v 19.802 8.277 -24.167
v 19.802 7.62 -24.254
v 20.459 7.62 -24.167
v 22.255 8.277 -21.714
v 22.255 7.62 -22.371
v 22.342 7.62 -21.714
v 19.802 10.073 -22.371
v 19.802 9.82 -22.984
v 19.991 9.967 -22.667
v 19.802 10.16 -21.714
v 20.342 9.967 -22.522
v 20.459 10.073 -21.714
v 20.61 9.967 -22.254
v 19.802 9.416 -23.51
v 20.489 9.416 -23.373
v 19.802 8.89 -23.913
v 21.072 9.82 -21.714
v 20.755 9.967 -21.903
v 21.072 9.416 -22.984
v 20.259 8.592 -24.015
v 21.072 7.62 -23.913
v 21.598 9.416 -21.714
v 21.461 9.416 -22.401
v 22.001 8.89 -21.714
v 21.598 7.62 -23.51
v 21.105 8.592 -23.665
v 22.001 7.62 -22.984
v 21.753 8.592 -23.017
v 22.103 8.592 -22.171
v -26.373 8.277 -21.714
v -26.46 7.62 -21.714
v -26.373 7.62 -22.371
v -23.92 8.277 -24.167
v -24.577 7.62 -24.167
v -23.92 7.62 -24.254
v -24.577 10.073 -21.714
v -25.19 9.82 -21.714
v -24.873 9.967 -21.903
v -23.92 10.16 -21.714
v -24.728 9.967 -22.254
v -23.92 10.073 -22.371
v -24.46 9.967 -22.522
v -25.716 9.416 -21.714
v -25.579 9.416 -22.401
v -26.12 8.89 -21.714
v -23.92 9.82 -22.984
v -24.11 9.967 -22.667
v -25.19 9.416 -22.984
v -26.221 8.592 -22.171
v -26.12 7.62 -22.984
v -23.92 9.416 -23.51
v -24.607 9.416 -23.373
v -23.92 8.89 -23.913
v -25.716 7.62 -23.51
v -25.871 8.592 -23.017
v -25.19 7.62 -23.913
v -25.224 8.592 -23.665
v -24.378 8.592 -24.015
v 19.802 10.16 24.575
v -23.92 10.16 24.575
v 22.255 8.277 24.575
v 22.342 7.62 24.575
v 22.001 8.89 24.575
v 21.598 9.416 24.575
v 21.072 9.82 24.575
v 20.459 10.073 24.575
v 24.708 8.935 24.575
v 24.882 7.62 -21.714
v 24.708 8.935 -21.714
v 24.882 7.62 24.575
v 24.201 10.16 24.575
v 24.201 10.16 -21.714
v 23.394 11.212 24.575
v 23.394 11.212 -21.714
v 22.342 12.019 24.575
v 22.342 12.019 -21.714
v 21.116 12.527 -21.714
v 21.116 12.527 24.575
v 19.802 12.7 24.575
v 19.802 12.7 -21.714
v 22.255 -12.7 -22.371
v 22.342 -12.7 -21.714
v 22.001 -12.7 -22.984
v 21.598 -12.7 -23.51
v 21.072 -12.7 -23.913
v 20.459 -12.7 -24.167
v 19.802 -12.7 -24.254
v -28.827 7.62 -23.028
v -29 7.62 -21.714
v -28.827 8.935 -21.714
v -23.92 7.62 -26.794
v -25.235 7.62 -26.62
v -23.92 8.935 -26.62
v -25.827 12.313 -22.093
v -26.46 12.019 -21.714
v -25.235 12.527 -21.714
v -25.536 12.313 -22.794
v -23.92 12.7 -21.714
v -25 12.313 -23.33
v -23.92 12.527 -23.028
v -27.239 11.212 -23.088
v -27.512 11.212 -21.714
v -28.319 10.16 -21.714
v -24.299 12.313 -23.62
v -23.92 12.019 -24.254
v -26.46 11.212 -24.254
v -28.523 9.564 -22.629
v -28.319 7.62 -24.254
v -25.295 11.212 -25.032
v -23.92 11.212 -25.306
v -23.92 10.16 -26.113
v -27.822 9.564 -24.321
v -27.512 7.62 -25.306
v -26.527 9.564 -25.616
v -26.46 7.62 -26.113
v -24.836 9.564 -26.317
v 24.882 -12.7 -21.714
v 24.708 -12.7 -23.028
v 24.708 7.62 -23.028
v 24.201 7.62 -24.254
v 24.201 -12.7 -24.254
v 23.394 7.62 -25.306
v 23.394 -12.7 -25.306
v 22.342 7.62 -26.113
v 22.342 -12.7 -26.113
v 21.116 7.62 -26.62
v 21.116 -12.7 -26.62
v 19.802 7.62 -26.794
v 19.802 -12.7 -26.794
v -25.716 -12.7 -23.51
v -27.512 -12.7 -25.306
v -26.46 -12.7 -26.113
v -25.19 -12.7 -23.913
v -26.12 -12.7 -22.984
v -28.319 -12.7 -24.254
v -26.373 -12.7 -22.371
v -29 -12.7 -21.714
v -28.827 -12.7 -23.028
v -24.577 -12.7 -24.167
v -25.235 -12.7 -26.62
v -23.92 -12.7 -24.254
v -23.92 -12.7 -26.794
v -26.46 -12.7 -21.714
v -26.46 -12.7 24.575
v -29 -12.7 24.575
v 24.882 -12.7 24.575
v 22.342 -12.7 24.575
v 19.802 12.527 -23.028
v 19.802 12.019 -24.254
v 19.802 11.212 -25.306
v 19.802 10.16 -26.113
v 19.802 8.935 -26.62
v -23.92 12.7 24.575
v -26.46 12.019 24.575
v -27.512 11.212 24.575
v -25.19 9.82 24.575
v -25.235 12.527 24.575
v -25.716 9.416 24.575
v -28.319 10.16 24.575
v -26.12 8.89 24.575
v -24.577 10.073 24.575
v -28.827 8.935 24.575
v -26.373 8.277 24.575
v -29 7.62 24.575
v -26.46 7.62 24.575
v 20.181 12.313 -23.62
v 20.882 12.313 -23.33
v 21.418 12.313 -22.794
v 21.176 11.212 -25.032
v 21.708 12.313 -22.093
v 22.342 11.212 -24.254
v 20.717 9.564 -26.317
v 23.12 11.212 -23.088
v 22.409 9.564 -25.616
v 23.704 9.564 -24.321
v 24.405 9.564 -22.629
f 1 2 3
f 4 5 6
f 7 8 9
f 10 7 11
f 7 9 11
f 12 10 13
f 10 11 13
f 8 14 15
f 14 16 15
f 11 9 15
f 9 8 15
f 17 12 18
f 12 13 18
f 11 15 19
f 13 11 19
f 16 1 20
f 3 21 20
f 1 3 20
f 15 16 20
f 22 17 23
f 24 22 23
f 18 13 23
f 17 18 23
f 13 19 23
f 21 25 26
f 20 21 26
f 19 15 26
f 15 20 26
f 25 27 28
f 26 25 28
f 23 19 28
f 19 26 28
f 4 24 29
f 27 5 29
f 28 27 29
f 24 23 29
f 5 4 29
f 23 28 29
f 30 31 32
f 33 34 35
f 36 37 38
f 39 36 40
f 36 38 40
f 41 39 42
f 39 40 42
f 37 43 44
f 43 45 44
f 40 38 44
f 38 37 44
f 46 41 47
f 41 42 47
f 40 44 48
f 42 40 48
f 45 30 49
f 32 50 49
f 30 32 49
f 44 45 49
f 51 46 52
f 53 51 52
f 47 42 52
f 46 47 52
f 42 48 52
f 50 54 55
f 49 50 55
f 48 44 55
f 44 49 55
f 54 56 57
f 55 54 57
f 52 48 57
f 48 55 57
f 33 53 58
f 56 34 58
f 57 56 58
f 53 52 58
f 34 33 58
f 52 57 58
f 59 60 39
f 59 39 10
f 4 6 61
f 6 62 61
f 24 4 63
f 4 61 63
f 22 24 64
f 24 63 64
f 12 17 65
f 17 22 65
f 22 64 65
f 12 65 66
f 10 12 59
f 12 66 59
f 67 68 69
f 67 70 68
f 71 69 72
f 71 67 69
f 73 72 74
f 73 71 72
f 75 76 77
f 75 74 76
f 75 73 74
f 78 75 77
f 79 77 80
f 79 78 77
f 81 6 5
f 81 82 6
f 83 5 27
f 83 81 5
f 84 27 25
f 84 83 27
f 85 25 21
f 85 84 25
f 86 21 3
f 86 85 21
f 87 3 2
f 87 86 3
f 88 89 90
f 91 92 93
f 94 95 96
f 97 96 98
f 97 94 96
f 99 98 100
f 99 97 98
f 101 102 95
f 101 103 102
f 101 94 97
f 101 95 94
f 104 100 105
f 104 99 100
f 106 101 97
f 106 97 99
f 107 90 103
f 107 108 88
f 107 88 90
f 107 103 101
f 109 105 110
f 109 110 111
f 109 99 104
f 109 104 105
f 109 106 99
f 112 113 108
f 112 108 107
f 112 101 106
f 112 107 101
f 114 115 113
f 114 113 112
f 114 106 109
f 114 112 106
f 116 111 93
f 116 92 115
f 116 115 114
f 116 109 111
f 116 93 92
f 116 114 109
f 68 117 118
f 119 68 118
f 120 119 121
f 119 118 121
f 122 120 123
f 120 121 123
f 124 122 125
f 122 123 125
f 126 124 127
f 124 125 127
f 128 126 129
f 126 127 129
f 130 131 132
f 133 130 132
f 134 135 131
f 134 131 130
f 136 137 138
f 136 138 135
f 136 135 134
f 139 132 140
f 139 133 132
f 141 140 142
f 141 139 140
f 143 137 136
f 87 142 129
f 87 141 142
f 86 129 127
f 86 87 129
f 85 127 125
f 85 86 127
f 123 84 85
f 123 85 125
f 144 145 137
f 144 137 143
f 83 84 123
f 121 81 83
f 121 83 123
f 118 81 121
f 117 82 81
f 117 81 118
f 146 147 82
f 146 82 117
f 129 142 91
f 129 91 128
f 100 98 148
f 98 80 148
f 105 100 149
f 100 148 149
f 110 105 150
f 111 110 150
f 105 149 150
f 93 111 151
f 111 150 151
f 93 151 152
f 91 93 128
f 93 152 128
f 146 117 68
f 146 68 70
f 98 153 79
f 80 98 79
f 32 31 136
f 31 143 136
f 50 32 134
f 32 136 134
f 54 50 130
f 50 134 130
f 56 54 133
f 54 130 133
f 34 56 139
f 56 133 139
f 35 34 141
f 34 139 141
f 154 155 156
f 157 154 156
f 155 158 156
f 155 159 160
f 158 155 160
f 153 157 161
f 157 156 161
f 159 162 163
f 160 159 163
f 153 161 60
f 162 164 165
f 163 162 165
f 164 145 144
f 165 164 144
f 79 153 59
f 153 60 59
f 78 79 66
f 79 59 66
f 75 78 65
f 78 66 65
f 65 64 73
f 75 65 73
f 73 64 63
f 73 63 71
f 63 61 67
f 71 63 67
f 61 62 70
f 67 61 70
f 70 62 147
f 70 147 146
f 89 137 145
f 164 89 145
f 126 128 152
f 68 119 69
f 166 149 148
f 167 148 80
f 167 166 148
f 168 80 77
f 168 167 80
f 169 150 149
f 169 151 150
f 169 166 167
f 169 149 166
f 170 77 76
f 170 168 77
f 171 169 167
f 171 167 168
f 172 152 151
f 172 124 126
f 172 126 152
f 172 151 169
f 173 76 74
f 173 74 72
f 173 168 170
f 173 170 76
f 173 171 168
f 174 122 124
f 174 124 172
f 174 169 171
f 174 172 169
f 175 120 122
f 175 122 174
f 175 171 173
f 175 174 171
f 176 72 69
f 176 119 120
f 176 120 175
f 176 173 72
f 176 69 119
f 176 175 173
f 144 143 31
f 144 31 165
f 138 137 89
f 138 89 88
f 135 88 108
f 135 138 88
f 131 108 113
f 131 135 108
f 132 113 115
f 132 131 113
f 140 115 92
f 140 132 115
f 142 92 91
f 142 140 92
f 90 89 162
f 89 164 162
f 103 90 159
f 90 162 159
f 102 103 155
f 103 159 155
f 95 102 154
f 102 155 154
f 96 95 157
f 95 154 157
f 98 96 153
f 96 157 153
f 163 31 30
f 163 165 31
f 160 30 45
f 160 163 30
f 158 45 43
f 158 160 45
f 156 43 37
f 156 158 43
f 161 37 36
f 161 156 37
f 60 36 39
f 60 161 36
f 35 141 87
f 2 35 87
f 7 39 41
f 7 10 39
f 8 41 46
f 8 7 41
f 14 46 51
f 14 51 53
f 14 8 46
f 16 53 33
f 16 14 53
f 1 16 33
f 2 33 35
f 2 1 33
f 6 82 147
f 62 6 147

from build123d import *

# Parameters (mm, degrees)
F0_W     = 53.881463
F0_H     = 51.368588
F1_DEPTH = 12.7
F2_R     = 5.08
F3_T     = -2.54


with BuildPart() as f1:
    # F0 (on Front) → F1 (new body, symmetric)
    with BuildSketch(Plane.XZ):
        with Locations((-2.059168, -1.109223)):
            Rectangle(F0_W, F0_H)
    extrude(amount=F1_DEPTH, both=True)

    # F2
    f2_edges = [f1.edges().sort_by_distance(p)[0] for p in [
        (24.881564, 0, -26.793517),
        (-28.999899, 0, -26.793517),
        (-28.999899, 12.7, -1.109223),
        (-2.059167, 12.7, -26.793517),
        (24.881564, 12.7, -1.109223),
    ]]
    fillet(f2_edges, radius=F2_R)

    # F3
    f3_openings = [f1.faces().sort_by_distance(p)[0] for p in [
        (-2.059167, -0.094363, 24.575071),
        (-2.059167, -12.7, -1.010586),
    ]]
    offset(amount=F3_T, openings=f3_openings)


solid = f1.part
